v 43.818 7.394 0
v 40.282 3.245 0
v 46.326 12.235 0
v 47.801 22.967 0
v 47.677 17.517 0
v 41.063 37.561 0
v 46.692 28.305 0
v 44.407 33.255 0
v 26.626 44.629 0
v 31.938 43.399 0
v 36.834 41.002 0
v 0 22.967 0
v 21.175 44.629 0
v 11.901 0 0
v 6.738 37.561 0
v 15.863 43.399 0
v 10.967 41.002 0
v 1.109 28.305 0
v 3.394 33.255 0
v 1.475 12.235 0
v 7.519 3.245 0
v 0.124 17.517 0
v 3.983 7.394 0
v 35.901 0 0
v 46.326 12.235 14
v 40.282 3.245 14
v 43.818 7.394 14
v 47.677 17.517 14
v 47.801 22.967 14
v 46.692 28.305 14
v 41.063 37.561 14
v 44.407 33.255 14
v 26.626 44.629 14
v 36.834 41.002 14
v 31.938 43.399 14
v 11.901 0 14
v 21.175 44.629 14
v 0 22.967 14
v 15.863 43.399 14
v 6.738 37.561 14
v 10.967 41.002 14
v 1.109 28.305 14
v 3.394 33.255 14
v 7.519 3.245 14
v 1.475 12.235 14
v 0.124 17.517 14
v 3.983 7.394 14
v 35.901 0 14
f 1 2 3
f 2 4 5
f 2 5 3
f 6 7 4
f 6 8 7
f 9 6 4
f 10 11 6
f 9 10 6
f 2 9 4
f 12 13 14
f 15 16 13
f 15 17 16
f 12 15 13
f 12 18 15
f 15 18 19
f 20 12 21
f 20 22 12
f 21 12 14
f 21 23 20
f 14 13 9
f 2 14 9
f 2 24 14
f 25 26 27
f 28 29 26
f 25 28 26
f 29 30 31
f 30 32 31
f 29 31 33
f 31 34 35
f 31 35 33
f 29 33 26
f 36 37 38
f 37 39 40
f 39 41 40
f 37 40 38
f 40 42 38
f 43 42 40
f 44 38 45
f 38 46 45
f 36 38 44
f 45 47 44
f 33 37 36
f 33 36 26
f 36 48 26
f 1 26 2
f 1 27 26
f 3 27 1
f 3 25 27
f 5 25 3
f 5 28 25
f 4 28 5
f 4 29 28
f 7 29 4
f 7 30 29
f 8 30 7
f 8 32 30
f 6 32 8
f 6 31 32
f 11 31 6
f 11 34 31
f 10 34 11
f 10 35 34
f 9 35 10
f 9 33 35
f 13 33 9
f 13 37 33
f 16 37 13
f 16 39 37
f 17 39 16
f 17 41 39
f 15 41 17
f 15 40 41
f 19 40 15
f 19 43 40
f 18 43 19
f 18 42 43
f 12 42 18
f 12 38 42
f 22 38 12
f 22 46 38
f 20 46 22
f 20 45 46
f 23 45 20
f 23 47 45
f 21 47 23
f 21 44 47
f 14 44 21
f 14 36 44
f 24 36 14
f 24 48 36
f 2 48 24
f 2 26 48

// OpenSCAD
$fn = 32;

// ----------------------------------------------------------------------
// Flat adaptor: single_d, 14 mm thick
// ----------------------------------------------------------------------

// --- parameters (mm) ---
profile_height = 14;      // extrusion height
profile_points = 24;      // points of the closed outline

profile = [[35.901, 0], [40.282, 3.245], [43.818, 7.394], [46.326, 12.235], [47.677, 17.517], [47.801, 22.967], [46.692, 28.305], [44.407, 33.255], [41.063, 37.561], [36.834, 41.002], [31.938, 43.399], [26.626, 44.629], [21.175, 44.629], [15.863, 43.399], [10.967, 41.002], [6.738, 37.561], [3.394, 33.255], [1.109, 28.305], [0, 22.967], [0.124, 17.517], [1.475, 12.235], [3.983, 7.394], [7.519, 3.245], [11.901, 0]];  // single closed polygon, 24 points, counter clockwise

// --- the one profile operation ---
linear_extrude(height = profile_height) polygon(points = profile);
